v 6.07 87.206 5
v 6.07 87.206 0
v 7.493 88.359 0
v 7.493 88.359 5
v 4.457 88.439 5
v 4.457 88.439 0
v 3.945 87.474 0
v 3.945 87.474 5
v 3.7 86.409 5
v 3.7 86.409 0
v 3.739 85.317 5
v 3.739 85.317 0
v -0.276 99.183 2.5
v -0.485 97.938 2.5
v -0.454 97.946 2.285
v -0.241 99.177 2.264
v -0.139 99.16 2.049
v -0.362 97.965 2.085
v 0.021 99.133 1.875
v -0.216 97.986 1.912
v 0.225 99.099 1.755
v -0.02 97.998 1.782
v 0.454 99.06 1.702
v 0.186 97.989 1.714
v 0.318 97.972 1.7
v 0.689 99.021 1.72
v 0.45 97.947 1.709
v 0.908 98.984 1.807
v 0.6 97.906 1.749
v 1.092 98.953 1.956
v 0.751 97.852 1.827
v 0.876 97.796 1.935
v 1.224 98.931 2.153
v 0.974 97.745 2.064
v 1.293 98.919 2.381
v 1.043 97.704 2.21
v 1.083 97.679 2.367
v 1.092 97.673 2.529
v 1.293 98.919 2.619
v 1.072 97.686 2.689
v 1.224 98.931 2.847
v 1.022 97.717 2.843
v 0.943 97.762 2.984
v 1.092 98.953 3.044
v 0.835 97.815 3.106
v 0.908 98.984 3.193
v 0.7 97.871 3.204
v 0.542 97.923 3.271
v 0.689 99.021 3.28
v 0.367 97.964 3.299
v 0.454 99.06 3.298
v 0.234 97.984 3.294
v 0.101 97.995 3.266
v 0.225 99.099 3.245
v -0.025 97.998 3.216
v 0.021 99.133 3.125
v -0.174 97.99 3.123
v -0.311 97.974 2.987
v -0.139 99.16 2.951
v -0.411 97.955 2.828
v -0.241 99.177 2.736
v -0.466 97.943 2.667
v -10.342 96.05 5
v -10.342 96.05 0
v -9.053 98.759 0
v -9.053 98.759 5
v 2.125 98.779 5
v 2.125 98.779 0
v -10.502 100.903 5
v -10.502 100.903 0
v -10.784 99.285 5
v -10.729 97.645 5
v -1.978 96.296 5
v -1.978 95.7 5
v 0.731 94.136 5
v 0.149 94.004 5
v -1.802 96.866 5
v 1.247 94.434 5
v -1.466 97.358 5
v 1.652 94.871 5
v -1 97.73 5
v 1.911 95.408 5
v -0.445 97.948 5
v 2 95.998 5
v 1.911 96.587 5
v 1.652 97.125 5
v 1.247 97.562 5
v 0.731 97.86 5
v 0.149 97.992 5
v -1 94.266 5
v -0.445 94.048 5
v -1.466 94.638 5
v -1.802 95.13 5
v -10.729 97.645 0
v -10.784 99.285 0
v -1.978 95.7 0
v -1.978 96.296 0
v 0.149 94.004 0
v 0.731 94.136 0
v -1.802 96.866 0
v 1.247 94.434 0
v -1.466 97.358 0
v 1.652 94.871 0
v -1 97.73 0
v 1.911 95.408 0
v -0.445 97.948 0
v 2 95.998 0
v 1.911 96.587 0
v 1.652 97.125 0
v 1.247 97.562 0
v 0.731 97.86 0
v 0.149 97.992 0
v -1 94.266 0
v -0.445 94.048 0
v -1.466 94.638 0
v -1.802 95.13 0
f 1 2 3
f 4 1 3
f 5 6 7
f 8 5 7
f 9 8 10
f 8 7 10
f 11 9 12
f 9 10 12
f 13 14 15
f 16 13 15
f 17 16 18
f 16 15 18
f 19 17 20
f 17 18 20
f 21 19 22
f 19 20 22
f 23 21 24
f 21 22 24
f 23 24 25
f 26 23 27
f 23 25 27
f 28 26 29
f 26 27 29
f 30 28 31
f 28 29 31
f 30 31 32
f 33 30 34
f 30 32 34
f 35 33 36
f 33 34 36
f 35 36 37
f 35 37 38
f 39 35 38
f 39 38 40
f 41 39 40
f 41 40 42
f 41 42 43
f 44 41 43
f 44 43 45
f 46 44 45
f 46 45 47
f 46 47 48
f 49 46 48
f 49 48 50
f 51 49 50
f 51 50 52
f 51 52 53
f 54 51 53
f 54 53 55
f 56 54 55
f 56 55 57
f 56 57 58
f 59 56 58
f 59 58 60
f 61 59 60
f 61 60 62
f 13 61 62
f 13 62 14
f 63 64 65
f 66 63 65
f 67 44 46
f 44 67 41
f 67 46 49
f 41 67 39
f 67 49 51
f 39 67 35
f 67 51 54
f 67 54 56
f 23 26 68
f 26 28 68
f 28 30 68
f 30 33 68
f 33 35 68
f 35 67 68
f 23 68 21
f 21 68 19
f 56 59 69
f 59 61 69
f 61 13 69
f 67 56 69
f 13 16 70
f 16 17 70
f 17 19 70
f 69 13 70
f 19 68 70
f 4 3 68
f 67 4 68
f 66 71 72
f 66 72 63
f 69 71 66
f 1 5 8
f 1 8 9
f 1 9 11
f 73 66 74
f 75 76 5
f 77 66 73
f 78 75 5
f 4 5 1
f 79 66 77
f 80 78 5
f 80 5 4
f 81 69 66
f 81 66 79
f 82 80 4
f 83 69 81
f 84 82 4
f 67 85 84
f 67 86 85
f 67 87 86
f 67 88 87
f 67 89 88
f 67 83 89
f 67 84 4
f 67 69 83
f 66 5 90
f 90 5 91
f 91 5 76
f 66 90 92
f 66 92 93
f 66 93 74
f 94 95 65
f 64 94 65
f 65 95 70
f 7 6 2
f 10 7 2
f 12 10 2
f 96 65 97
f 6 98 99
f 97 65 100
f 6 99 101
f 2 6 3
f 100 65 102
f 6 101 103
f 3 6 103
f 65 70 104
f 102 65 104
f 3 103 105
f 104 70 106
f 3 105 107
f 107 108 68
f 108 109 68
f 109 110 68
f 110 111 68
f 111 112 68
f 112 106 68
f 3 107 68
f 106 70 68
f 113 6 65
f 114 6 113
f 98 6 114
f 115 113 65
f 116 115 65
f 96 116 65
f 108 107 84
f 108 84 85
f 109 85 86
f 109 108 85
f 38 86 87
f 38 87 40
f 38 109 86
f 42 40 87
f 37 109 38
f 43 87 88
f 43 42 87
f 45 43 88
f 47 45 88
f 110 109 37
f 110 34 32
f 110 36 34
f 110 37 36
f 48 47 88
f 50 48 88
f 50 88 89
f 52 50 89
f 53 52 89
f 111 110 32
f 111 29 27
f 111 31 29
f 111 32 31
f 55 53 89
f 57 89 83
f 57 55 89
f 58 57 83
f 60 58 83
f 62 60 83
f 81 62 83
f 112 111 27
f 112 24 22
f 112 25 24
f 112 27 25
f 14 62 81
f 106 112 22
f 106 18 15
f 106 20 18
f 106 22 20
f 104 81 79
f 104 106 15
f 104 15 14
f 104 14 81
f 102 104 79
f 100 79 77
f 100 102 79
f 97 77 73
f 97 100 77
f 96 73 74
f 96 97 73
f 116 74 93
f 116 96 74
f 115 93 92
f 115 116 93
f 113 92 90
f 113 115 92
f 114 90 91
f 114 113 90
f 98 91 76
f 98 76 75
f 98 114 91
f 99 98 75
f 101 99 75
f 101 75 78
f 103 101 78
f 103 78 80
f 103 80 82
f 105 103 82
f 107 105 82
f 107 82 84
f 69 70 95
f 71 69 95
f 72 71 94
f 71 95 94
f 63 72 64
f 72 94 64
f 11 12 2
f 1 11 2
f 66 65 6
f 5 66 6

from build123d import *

# Parameters (mm, degrees)
SKETCH1_R                 = 2
BOSS_EXTRUDE1_DEPTH       = 5
M2X0_4_TAPPED_HOLE1_D     = 1.6
M2X0_4_TAPPED_HOLE1_DEPTH = 2.999994
M2X0_4_TAPPED_HOLE1_TIP   = 0.480688495


with BuildPart() as part:
    # Sketch1 → Boss-Extrude1 (new body)
    with BuildSketch(Plane.XY):
        with BuildLine():
            Line((7.49299434, 88.359418723), (2.124641235, 98.779265156))
            Line((2.124641235, 98.779265156), (-10.502416807, 100.902673639))
            ThreePointArc((-10.502416807, 100.902673639), (-10.798602236, 98.463827502), (-10.342383239, 96.049793427))
            Line((-10.342383239, 96.049793427), (-9.053191571, 98.758664935))
            Line((-9.053191571, 98.758664935), (4.456621188, 88.438669077))
            ThreePointArc((4.456621188, 88.438669077), (3.787347561, 86.94932011), (3.73945192, 85.317206897))
            Line((3.73945192, 85.317206897), (6.070083914, 87.206162828))
            Line((6.070083914, 87.206162828), (7.49299434, 88.359418723))
        make_face()
        with Locations((0, 95.99791663)):
            Circle(SKETCH1_R, mode=Mode.SUBTRACT)
    extrude(amount=BOSS_EXTRUDE1_DEPTH)

    # M2x0.4 Tapped Hole1
    with Locations(Plane(origin=(16.212659079, 96.410176767, 0), x_dir=(0.986153532, -0.16583489, 0), z_dir=(0.16583489, 0.986153532, 0))):
        with Locations((-15.919803906, -2.5)):
            Hole(M2X0_4_TAPPED_HOLE1_D / 2, depth=M2X0_4_TAPPED_HOLE1_DEPTH)
            with Locations((0, 0, -(M2X0_4_TAPPED_HOLE1_DEPTH + M2X0_4_TAPPED_HOLE1_TIP / 2))):  # 118° drill point
                Cone(0, M2X0_4_TAPPED_HOLE1_D / 2, M2X0_4_TAPPED_HOLE1_TIP, mode=Mode.SUBTRACT)


solid = part.part
